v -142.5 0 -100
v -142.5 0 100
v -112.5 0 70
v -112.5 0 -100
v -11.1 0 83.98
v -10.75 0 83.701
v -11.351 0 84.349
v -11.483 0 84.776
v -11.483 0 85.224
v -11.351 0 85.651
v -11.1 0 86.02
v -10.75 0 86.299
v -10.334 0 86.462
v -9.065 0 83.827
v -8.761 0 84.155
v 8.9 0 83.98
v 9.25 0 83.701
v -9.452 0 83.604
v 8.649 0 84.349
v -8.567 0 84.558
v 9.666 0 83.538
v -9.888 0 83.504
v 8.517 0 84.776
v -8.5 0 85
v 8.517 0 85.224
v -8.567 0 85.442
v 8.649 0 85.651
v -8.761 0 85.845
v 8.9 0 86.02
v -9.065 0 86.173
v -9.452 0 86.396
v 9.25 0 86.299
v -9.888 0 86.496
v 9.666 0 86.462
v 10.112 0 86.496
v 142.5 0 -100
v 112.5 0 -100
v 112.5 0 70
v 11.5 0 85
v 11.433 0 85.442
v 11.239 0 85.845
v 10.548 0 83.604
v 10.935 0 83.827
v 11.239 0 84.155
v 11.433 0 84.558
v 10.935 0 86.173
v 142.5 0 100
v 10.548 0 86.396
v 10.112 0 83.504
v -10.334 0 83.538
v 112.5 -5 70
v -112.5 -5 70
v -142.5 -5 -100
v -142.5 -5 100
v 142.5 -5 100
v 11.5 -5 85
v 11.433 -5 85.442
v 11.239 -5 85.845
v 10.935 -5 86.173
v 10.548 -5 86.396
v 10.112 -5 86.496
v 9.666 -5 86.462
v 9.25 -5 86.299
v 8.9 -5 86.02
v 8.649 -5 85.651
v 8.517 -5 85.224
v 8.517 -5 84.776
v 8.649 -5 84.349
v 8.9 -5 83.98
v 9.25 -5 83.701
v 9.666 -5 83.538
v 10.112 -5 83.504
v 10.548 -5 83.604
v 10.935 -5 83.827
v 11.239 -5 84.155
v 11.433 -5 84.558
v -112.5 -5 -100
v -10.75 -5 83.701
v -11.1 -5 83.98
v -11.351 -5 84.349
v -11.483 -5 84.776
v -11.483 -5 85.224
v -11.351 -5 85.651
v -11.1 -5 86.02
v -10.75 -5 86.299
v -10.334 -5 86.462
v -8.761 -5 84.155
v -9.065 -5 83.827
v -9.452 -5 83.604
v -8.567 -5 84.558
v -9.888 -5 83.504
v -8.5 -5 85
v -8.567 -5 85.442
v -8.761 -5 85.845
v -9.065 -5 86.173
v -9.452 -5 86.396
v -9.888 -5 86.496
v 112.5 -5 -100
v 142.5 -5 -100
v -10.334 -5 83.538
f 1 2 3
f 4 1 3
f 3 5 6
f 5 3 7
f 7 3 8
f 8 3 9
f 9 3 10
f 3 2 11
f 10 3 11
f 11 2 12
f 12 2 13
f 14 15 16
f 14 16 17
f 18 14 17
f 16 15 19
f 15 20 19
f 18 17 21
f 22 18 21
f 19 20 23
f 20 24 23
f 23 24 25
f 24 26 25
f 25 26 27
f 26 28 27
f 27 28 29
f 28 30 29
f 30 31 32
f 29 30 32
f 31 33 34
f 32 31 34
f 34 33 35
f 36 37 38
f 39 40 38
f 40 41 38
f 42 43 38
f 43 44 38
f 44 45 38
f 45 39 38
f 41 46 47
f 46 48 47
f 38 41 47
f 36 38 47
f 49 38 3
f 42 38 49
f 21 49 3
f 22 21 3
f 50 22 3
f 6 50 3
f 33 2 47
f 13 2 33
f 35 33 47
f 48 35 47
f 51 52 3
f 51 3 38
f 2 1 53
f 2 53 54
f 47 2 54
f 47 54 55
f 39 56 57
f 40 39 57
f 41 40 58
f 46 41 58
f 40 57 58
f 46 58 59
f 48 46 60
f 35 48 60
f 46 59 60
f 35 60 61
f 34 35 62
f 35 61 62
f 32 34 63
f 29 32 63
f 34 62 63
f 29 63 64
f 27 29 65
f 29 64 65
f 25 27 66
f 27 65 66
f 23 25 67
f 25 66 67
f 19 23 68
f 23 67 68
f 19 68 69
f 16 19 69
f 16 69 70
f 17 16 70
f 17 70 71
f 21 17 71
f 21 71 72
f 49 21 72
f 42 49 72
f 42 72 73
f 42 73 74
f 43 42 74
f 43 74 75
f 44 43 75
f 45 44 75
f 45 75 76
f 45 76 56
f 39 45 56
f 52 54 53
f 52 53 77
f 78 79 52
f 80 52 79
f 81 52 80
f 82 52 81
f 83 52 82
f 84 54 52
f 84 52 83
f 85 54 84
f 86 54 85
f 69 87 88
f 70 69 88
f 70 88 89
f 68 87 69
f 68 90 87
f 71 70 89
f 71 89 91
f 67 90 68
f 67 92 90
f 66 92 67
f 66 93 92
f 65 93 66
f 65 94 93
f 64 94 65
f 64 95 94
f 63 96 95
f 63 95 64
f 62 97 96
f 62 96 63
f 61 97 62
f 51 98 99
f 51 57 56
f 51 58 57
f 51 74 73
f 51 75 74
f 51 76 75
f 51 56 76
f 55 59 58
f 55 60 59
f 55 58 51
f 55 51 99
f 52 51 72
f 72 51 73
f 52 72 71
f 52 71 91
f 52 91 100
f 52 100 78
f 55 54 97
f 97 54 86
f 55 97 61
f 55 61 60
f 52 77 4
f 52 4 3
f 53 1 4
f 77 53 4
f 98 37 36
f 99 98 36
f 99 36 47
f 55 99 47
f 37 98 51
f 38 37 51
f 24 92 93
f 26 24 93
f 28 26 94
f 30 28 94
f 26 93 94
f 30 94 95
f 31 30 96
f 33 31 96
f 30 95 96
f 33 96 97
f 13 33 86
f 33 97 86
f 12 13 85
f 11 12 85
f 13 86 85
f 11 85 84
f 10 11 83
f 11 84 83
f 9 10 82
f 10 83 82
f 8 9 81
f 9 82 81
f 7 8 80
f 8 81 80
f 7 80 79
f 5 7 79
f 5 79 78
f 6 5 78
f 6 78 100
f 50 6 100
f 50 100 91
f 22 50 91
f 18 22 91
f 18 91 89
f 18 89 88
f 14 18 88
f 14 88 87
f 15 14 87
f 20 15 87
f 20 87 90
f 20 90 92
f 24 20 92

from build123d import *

# Parameters (mm, degrees)
F0_W     = 285
F0_H     = 200
F1_DEPTH = 5
F2_W     = 225
F2_H     = 170
F3_DEPTH = 25
F4_R     = 1.5
F5_DEPTH = 25


with BuildPart() as f1:
    # F0 (on Front) → F1 (new body)
    with BuildSketch(Plane.XZ):
        Rectangle(F0_W, F0_H)
    extrude(amount=F1_DEPTH)

    # F2 (on face) → F3 (cut)
    with BuildSketch(Plane.XZ.offset(5)):
        with Locations((0, -15)):
            Rectangle(F2_W, F2_H)
    extrude(amount=-F3_DEPTH, mode=Mode.SUBTRACT)

    # F4 (on face) → F5 (cut)
    with BuildSketch(Plane.XZ.offset(5)):
        with Locations((-10, 85)):
            Circle(F4_R)
        with Locations((10, 85)):
            Circle(F4_R)
    extrude(amount=-F5_DEPTH, mode=Mode.SUBTRACT)


solid = f1.part
